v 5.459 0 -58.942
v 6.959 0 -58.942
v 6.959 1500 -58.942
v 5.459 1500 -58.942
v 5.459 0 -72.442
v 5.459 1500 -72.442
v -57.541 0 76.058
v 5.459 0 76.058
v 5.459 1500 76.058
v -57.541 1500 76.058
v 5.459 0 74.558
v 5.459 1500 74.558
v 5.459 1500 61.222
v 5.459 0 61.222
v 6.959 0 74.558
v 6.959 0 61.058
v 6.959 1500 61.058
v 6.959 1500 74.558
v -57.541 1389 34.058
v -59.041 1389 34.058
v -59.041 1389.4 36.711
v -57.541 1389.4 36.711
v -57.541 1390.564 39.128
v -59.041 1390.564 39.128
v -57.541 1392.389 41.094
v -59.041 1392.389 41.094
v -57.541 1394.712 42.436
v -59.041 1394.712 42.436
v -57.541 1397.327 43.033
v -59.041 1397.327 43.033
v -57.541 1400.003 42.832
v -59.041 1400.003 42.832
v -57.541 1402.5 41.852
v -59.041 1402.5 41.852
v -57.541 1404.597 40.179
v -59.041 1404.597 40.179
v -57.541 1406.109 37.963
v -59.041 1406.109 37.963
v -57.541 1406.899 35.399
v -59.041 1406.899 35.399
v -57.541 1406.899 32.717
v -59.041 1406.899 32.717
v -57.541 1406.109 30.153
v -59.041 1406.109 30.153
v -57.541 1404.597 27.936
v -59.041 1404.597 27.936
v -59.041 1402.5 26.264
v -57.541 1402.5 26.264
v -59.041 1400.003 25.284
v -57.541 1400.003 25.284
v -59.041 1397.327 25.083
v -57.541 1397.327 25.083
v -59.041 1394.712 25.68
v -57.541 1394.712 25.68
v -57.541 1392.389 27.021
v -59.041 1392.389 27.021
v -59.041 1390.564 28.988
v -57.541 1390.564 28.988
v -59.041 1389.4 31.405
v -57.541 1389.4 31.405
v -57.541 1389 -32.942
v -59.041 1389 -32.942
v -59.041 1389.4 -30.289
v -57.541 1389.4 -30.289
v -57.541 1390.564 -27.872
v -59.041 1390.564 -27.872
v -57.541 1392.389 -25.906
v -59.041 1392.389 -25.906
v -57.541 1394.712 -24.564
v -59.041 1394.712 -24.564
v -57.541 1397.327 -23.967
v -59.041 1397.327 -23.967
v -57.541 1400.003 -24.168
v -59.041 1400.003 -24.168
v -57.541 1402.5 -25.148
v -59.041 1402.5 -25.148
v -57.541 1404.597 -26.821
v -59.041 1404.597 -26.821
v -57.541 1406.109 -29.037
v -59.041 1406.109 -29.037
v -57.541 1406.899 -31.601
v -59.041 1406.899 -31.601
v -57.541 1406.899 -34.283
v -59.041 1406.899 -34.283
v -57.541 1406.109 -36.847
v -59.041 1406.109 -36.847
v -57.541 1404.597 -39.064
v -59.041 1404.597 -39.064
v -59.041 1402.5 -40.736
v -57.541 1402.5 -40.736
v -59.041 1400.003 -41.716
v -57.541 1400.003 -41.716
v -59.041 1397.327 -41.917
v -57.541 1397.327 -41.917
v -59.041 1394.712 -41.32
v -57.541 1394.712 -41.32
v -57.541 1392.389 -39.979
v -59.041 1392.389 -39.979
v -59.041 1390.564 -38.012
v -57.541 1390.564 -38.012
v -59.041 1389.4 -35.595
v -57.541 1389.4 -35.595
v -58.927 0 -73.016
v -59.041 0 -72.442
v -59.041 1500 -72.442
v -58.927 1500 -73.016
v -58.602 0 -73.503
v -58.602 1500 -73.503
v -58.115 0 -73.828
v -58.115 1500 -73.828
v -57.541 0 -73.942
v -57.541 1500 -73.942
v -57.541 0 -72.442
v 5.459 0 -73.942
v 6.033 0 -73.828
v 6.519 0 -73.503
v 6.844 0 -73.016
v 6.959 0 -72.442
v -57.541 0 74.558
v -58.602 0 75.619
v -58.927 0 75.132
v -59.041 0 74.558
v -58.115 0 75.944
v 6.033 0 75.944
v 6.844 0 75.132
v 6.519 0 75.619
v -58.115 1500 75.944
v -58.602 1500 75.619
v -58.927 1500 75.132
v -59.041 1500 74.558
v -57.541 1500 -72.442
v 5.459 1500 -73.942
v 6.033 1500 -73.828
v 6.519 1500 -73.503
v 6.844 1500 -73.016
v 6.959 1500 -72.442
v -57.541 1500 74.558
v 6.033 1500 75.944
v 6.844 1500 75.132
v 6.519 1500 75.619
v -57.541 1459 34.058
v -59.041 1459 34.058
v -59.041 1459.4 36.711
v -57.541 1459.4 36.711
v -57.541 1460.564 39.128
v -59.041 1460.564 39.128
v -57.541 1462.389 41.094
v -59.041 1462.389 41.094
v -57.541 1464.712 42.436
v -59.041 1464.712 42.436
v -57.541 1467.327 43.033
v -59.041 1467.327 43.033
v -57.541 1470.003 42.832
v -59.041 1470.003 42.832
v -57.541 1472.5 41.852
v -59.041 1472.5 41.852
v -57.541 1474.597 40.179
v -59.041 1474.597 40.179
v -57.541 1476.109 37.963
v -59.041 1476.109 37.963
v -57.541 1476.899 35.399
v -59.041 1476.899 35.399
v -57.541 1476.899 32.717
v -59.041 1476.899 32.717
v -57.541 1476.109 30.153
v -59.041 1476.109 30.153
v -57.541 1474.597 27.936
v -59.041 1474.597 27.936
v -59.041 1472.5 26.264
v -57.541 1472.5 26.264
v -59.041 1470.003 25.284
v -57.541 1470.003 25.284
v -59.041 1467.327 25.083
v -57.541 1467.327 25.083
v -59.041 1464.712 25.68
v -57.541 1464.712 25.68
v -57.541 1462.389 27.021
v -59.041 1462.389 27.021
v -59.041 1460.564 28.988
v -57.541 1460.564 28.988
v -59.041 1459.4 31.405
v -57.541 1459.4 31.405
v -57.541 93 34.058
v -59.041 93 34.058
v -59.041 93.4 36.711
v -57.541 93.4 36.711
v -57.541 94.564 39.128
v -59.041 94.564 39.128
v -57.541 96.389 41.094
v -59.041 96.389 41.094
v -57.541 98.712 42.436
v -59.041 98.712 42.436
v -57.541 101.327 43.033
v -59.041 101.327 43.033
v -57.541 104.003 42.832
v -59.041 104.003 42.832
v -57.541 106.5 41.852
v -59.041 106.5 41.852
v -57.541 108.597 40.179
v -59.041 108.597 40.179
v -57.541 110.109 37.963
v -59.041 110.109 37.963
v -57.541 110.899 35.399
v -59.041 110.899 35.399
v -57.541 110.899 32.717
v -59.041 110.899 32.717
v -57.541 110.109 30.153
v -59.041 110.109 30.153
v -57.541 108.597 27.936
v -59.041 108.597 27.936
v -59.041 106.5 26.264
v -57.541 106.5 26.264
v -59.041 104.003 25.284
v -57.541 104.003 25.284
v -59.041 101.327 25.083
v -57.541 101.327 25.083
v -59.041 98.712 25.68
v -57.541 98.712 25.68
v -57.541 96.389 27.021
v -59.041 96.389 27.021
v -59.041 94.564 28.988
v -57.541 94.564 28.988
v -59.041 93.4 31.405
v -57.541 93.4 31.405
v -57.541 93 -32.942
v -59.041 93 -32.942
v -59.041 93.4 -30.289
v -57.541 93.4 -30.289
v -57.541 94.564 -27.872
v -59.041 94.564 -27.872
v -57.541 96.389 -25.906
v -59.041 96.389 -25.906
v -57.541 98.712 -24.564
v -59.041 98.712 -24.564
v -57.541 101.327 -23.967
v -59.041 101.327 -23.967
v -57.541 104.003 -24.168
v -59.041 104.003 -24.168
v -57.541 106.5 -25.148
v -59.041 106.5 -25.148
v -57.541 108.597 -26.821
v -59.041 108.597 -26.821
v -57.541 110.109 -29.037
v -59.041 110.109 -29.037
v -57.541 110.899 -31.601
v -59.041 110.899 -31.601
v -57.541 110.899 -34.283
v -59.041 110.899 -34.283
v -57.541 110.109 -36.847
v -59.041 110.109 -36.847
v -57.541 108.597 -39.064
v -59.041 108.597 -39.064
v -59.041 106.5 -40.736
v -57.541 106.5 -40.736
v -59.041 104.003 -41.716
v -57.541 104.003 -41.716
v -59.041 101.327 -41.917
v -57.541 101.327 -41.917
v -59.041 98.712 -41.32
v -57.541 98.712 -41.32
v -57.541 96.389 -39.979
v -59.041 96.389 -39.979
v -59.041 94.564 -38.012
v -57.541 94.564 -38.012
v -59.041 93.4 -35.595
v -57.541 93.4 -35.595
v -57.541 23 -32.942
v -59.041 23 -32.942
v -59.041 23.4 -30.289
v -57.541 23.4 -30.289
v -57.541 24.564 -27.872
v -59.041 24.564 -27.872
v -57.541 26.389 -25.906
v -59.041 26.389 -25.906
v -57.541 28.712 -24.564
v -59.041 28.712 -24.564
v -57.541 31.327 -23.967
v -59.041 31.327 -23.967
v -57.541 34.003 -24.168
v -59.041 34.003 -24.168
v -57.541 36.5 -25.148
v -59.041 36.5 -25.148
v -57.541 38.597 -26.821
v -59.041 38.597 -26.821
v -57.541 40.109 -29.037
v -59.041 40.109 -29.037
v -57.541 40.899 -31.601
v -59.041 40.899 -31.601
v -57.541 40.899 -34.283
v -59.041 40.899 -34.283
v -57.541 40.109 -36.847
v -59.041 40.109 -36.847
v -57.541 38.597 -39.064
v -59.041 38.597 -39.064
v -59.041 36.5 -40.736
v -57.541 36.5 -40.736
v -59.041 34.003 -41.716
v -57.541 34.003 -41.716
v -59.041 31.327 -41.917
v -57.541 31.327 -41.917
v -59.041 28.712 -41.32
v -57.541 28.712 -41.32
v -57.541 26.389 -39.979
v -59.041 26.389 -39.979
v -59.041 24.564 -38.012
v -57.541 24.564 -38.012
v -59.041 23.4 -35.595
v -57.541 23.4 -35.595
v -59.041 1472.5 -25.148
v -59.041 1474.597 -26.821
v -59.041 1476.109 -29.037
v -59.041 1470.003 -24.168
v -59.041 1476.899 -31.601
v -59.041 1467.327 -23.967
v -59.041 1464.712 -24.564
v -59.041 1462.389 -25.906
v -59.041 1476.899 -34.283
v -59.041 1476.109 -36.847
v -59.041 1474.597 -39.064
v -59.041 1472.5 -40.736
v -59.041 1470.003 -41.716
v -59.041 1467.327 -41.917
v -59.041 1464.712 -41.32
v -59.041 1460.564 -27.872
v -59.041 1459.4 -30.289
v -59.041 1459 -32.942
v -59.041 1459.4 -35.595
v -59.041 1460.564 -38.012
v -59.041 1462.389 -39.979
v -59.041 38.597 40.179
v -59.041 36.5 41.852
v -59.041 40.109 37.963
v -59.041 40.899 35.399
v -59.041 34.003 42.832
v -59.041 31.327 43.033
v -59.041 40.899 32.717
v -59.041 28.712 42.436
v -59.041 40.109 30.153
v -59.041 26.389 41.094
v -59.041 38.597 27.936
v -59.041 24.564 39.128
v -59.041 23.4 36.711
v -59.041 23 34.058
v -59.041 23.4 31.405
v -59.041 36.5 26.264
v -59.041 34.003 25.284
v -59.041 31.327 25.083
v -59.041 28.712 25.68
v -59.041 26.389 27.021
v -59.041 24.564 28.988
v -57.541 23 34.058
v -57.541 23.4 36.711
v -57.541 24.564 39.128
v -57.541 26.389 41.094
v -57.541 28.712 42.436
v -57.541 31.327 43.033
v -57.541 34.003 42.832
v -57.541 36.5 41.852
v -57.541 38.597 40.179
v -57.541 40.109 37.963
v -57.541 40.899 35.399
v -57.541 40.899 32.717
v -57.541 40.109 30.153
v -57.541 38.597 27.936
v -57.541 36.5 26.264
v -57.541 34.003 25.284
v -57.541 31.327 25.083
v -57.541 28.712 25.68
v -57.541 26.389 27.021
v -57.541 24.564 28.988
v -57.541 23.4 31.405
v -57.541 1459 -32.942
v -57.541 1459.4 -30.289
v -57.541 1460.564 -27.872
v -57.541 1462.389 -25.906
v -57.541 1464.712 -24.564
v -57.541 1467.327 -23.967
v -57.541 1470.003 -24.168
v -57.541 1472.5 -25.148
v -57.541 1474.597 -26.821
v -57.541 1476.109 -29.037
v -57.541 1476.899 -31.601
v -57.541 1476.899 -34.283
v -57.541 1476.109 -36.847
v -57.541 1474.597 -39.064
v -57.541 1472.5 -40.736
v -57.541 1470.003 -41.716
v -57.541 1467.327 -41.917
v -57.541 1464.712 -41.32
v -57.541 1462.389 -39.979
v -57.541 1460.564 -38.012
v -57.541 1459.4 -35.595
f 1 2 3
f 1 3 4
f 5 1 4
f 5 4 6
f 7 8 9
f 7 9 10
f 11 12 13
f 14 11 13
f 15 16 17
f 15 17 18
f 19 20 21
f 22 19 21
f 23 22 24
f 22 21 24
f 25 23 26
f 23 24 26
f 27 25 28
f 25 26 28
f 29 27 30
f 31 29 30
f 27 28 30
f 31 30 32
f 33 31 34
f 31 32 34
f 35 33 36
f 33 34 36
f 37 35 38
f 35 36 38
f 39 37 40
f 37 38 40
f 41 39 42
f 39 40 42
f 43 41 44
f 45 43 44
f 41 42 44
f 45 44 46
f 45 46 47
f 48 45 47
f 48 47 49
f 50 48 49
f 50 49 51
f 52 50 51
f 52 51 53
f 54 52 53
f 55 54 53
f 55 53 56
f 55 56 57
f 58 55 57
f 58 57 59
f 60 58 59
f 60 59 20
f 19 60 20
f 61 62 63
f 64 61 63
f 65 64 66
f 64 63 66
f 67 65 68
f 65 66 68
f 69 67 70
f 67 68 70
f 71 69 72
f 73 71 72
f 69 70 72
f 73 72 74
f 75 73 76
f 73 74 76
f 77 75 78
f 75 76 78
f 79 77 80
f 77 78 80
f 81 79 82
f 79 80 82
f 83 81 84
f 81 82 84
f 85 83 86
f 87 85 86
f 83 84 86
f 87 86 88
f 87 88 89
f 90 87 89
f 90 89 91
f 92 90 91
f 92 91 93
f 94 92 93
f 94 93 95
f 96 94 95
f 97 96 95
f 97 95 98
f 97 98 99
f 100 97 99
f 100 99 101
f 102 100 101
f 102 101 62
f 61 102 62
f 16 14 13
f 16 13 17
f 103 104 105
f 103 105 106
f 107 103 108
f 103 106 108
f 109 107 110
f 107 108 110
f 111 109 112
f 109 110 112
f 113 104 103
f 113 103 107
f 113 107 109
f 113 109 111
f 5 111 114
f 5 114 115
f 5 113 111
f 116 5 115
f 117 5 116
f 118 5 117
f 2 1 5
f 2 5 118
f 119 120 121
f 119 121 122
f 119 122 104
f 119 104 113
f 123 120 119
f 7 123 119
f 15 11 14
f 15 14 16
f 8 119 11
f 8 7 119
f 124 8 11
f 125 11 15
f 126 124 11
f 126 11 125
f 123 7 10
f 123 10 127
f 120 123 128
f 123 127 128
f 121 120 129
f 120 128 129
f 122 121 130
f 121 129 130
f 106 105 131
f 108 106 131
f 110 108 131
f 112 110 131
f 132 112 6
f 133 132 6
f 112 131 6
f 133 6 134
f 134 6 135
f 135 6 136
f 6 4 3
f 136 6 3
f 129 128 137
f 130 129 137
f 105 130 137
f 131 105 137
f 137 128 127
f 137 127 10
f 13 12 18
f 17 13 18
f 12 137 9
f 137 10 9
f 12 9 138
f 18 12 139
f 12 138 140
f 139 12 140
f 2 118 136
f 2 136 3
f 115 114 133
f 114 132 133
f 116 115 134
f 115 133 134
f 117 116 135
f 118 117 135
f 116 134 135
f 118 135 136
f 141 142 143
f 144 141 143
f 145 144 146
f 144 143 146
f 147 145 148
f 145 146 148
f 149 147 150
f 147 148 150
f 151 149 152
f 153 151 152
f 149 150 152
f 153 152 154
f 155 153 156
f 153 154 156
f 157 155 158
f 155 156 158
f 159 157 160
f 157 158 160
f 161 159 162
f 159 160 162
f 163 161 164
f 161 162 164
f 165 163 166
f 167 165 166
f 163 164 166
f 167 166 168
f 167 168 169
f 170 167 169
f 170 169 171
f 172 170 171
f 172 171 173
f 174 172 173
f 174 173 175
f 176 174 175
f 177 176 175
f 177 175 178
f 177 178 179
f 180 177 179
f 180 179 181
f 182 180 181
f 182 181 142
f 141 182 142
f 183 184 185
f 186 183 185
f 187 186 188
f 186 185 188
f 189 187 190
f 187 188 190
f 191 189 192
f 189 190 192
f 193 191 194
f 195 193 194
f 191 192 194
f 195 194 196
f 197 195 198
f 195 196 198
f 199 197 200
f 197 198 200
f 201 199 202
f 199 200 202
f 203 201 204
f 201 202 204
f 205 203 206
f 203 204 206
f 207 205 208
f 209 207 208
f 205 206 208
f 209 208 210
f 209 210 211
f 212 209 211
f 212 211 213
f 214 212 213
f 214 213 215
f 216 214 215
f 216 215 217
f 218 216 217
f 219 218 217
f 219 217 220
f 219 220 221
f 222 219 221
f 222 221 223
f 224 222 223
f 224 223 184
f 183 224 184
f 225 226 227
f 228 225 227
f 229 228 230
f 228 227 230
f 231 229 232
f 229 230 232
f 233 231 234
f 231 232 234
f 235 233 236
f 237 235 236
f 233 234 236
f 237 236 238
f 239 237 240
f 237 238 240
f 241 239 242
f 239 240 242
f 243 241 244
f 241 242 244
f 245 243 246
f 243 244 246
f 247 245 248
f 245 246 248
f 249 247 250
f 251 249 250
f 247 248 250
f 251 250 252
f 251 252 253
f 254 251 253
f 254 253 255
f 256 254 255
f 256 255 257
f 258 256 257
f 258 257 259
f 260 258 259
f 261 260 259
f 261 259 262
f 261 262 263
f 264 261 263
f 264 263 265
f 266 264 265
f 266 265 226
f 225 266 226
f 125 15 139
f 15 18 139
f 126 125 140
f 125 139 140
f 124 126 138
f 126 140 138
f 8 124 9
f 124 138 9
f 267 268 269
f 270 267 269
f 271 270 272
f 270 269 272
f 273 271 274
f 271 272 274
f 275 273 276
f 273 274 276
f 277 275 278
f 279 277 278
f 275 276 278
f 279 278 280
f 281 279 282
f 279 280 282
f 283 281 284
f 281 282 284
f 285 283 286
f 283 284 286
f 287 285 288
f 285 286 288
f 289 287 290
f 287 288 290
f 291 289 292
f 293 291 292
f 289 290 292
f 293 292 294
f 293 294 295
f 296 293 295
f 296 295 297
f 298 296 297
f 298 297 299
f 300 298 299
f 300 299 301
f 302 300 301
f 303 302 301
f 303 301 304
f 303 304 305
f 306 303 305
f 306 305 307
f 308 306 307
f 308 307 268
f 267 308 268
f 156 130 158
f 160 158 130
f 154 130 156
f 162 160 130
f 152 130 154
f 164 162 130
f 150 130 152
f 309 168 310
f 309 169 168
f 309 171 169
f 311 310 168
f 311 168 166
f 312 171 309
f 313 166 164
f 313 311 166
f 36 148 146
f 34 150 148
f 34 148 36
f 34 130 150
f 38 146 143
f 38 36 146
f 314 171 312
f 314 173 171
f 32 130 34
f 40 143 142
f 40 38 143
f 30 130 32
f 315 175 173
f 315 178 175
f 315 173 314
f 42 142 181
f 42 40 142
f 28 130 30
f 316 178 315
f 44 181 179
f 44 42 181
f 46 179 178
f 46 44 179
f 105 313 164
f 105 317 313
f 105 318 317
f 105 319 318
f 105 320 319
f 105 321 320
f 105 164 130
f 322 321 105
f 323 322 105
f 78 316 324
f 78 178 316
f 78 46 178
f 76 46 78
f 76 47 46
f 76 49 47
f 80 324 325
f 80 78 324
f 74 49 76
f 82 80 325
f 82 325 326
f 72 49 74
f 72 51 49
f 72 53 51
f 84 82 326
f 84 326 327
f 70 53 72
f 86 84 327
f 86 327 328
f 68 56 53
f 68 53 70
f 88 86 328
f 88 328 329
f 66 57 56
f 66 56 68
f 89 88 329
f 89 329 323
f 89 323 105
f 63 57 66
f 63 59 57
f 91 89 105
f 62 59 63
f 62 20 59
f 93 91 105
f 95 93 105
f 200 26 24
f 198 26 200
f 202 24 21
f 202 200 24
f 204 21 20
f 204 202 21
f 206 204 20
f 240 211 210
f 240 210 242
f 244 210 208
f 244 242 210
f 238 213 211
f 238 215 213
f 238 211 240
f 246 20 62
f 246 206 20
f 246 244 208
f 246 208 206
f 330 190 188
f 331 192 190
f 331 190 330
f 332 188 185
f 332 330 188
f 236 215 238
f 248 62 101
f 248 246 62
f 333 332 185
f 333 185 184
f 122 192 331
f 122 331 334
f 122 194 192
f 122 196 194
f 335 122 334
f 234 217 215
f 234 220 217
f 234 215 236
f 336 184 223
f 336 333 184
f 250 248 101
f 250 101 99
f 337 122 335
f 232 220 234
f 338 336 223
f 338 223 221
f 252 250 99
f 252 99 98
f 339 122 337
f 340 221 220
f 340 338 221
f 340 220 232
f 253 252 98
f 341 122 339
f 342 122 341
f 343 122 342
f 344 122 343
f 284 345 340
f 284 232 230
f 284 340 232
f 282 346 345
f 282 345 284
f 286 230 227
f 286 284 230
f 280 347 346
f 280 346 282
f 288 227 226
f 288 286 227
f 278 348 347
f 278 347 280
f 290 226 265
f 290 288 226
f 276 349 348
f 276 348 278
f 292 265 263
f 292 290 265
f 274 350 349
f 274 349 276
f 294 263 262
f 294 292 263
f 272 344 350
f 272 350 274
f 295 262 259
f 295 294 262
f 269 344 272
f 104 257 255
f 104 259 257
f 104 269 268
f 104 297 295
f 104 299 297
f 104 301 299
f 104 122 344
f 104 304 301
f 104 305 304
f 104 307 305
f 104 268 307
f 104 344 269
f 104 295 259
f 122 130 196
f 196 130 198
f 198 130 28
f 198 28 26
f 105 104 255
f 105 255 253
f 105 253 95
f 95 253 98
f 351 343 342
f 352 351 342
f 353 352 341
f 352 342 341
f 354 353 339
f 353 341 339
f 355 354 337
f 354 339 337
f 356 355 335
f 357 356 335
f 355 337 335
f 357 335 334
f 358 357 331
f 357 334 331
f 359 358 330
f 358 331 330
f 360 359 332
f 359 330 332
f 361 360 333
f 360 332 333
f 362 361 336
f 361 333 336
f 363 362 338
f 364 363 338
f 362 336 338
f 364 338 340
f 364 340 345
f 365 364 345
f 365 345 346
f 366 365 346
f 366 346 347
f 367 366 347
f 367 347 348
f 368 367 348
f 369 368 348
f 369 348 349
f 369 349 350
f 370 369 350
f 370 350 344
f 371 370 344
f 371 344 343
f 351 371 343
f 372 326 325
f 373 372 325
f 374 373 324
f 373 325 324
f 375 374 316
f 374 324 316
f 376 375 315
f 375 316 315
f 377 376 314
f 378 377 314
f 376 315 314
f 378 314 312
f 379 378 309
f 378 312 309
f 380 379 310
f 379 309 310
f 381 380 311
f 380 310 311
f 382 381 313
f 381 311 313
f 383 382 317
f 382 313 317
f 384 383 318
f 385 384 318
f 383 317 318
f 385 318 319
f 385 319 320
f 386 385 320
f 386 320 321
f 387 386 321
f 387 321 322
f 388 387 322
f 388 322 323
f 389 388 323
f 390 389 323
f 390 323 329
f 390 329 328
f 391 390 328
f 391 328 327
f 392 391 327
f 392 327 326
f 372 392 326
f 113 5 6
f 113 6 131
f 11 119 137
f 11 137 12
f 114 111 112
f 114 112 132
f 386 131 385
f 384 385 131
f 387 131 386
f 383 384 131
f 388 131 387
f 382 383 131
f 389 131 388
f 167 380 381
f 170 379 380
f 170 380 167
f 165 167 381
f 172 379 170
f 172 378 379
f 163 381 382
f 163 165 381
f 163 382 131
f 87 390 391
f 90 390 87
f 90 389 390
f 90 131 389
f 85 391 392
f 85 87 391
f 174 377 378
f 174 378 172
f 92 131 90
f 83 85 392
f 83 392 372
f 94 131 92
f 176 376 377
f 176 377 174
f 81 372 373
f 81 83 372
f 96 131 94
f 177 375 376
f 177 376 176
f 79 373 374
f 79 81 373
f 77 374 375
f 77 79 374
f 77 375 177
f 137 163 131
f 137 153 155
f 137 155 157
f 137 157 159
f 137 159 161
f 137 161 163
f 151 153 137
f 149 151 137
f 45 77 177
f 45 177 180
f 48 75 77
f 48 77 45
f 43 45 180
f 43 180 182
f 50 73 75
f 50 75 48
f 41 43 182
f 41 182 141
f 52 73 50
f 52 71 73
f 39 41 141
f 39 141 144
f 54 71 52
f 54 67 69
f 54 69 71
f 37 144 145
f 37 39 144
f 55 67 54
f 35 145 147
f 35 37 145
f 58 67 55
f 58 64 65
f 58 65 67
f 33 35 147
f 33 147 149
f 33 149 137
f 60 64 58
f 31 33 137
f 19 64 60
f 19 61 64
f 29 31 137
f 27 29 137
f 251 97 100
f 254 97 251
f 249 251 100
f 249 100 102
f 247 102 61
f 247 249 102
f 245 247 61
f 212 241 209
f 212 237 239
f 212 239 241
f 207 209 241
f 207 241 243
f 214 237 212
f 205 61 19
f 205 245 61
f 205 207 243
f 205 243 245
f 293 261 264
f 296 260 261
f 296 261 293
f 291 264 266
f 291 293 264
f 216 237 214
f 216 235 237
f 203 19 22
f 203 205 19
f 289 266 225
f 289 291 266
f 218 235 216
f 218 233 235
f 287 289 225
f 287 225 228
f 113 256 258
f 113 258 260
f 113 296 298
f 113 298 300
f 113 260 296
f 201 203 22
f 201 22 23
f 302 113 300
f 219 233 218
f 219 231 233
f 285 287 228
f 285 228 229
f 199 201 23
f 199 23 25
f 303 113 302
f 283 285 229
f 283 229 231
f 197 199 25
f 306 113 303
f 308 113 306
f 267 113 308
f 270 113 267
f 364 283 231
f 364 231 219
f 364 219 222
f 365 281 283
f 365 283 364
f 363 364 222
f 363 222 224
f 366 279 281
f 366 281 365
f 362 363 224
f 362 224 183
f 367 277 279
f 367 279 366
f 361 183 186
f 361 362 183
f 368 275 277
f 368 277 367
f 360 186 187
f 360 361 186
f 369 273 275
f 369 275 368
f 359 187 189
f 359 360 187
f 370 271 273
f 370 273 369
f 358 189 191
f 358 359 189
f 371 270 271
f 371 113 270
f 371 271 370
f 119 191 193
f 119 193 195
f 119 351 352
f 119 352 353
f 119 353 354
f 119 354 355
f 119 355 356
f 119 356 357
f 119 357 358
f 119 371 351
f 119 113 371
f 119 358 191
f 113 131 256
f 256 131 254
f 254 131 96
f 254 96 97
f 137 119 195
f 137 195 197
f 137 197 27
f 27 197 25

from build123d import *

# Parameters (mm, degrees)
F1_DEPTH = 1500
F2_R     = 1.5
F4_D     = 18


with BuildPart() as f1:
    # F0 (on Front) → F1 (new body)
    with BuildSketch(Plane.XZ):
        Polygon((5.458542, 61.221596), (6.958542, 61.057889), (6.958542, 76.057889), (-59.041458, 76.057889), (-59.041458, -73.942111), (6.958542, -73.942111), (6.958542, -58.942111), (5.458542, -58.942111), (5.458542, -72.442111), (-57.541458, -72.442111), (-57.541458, 74.557889), (5.458542, 74.557889), align=None)
    extrude(amount=-F1_DEPTH)

    # F2
    f2_edges = [f1.edges().sort_by_distance(p)[0] for p in [
        (-59.041458, 750, 76.057889),
        (6.958542, 750, 76.057889),
        (6.958542, 750, -73.942111),
        (-59.041458, 750, -73.942111),
    ]]
    fillet(f2_edges, radius=F2_R)

    # F4 (through all)
    with Locations(Plane.YZ.offset(-57.541458)):
        with Locations((32, 34.057889), (102, 34.057889), (31.999985, -32.942111), (102, -32.942111), (1468, 34.057889), (1398, 34.057889), (1398, -32.942111), (1468, -32.942111)):
            Hole(F4_D / 2)


solid = f1.part
